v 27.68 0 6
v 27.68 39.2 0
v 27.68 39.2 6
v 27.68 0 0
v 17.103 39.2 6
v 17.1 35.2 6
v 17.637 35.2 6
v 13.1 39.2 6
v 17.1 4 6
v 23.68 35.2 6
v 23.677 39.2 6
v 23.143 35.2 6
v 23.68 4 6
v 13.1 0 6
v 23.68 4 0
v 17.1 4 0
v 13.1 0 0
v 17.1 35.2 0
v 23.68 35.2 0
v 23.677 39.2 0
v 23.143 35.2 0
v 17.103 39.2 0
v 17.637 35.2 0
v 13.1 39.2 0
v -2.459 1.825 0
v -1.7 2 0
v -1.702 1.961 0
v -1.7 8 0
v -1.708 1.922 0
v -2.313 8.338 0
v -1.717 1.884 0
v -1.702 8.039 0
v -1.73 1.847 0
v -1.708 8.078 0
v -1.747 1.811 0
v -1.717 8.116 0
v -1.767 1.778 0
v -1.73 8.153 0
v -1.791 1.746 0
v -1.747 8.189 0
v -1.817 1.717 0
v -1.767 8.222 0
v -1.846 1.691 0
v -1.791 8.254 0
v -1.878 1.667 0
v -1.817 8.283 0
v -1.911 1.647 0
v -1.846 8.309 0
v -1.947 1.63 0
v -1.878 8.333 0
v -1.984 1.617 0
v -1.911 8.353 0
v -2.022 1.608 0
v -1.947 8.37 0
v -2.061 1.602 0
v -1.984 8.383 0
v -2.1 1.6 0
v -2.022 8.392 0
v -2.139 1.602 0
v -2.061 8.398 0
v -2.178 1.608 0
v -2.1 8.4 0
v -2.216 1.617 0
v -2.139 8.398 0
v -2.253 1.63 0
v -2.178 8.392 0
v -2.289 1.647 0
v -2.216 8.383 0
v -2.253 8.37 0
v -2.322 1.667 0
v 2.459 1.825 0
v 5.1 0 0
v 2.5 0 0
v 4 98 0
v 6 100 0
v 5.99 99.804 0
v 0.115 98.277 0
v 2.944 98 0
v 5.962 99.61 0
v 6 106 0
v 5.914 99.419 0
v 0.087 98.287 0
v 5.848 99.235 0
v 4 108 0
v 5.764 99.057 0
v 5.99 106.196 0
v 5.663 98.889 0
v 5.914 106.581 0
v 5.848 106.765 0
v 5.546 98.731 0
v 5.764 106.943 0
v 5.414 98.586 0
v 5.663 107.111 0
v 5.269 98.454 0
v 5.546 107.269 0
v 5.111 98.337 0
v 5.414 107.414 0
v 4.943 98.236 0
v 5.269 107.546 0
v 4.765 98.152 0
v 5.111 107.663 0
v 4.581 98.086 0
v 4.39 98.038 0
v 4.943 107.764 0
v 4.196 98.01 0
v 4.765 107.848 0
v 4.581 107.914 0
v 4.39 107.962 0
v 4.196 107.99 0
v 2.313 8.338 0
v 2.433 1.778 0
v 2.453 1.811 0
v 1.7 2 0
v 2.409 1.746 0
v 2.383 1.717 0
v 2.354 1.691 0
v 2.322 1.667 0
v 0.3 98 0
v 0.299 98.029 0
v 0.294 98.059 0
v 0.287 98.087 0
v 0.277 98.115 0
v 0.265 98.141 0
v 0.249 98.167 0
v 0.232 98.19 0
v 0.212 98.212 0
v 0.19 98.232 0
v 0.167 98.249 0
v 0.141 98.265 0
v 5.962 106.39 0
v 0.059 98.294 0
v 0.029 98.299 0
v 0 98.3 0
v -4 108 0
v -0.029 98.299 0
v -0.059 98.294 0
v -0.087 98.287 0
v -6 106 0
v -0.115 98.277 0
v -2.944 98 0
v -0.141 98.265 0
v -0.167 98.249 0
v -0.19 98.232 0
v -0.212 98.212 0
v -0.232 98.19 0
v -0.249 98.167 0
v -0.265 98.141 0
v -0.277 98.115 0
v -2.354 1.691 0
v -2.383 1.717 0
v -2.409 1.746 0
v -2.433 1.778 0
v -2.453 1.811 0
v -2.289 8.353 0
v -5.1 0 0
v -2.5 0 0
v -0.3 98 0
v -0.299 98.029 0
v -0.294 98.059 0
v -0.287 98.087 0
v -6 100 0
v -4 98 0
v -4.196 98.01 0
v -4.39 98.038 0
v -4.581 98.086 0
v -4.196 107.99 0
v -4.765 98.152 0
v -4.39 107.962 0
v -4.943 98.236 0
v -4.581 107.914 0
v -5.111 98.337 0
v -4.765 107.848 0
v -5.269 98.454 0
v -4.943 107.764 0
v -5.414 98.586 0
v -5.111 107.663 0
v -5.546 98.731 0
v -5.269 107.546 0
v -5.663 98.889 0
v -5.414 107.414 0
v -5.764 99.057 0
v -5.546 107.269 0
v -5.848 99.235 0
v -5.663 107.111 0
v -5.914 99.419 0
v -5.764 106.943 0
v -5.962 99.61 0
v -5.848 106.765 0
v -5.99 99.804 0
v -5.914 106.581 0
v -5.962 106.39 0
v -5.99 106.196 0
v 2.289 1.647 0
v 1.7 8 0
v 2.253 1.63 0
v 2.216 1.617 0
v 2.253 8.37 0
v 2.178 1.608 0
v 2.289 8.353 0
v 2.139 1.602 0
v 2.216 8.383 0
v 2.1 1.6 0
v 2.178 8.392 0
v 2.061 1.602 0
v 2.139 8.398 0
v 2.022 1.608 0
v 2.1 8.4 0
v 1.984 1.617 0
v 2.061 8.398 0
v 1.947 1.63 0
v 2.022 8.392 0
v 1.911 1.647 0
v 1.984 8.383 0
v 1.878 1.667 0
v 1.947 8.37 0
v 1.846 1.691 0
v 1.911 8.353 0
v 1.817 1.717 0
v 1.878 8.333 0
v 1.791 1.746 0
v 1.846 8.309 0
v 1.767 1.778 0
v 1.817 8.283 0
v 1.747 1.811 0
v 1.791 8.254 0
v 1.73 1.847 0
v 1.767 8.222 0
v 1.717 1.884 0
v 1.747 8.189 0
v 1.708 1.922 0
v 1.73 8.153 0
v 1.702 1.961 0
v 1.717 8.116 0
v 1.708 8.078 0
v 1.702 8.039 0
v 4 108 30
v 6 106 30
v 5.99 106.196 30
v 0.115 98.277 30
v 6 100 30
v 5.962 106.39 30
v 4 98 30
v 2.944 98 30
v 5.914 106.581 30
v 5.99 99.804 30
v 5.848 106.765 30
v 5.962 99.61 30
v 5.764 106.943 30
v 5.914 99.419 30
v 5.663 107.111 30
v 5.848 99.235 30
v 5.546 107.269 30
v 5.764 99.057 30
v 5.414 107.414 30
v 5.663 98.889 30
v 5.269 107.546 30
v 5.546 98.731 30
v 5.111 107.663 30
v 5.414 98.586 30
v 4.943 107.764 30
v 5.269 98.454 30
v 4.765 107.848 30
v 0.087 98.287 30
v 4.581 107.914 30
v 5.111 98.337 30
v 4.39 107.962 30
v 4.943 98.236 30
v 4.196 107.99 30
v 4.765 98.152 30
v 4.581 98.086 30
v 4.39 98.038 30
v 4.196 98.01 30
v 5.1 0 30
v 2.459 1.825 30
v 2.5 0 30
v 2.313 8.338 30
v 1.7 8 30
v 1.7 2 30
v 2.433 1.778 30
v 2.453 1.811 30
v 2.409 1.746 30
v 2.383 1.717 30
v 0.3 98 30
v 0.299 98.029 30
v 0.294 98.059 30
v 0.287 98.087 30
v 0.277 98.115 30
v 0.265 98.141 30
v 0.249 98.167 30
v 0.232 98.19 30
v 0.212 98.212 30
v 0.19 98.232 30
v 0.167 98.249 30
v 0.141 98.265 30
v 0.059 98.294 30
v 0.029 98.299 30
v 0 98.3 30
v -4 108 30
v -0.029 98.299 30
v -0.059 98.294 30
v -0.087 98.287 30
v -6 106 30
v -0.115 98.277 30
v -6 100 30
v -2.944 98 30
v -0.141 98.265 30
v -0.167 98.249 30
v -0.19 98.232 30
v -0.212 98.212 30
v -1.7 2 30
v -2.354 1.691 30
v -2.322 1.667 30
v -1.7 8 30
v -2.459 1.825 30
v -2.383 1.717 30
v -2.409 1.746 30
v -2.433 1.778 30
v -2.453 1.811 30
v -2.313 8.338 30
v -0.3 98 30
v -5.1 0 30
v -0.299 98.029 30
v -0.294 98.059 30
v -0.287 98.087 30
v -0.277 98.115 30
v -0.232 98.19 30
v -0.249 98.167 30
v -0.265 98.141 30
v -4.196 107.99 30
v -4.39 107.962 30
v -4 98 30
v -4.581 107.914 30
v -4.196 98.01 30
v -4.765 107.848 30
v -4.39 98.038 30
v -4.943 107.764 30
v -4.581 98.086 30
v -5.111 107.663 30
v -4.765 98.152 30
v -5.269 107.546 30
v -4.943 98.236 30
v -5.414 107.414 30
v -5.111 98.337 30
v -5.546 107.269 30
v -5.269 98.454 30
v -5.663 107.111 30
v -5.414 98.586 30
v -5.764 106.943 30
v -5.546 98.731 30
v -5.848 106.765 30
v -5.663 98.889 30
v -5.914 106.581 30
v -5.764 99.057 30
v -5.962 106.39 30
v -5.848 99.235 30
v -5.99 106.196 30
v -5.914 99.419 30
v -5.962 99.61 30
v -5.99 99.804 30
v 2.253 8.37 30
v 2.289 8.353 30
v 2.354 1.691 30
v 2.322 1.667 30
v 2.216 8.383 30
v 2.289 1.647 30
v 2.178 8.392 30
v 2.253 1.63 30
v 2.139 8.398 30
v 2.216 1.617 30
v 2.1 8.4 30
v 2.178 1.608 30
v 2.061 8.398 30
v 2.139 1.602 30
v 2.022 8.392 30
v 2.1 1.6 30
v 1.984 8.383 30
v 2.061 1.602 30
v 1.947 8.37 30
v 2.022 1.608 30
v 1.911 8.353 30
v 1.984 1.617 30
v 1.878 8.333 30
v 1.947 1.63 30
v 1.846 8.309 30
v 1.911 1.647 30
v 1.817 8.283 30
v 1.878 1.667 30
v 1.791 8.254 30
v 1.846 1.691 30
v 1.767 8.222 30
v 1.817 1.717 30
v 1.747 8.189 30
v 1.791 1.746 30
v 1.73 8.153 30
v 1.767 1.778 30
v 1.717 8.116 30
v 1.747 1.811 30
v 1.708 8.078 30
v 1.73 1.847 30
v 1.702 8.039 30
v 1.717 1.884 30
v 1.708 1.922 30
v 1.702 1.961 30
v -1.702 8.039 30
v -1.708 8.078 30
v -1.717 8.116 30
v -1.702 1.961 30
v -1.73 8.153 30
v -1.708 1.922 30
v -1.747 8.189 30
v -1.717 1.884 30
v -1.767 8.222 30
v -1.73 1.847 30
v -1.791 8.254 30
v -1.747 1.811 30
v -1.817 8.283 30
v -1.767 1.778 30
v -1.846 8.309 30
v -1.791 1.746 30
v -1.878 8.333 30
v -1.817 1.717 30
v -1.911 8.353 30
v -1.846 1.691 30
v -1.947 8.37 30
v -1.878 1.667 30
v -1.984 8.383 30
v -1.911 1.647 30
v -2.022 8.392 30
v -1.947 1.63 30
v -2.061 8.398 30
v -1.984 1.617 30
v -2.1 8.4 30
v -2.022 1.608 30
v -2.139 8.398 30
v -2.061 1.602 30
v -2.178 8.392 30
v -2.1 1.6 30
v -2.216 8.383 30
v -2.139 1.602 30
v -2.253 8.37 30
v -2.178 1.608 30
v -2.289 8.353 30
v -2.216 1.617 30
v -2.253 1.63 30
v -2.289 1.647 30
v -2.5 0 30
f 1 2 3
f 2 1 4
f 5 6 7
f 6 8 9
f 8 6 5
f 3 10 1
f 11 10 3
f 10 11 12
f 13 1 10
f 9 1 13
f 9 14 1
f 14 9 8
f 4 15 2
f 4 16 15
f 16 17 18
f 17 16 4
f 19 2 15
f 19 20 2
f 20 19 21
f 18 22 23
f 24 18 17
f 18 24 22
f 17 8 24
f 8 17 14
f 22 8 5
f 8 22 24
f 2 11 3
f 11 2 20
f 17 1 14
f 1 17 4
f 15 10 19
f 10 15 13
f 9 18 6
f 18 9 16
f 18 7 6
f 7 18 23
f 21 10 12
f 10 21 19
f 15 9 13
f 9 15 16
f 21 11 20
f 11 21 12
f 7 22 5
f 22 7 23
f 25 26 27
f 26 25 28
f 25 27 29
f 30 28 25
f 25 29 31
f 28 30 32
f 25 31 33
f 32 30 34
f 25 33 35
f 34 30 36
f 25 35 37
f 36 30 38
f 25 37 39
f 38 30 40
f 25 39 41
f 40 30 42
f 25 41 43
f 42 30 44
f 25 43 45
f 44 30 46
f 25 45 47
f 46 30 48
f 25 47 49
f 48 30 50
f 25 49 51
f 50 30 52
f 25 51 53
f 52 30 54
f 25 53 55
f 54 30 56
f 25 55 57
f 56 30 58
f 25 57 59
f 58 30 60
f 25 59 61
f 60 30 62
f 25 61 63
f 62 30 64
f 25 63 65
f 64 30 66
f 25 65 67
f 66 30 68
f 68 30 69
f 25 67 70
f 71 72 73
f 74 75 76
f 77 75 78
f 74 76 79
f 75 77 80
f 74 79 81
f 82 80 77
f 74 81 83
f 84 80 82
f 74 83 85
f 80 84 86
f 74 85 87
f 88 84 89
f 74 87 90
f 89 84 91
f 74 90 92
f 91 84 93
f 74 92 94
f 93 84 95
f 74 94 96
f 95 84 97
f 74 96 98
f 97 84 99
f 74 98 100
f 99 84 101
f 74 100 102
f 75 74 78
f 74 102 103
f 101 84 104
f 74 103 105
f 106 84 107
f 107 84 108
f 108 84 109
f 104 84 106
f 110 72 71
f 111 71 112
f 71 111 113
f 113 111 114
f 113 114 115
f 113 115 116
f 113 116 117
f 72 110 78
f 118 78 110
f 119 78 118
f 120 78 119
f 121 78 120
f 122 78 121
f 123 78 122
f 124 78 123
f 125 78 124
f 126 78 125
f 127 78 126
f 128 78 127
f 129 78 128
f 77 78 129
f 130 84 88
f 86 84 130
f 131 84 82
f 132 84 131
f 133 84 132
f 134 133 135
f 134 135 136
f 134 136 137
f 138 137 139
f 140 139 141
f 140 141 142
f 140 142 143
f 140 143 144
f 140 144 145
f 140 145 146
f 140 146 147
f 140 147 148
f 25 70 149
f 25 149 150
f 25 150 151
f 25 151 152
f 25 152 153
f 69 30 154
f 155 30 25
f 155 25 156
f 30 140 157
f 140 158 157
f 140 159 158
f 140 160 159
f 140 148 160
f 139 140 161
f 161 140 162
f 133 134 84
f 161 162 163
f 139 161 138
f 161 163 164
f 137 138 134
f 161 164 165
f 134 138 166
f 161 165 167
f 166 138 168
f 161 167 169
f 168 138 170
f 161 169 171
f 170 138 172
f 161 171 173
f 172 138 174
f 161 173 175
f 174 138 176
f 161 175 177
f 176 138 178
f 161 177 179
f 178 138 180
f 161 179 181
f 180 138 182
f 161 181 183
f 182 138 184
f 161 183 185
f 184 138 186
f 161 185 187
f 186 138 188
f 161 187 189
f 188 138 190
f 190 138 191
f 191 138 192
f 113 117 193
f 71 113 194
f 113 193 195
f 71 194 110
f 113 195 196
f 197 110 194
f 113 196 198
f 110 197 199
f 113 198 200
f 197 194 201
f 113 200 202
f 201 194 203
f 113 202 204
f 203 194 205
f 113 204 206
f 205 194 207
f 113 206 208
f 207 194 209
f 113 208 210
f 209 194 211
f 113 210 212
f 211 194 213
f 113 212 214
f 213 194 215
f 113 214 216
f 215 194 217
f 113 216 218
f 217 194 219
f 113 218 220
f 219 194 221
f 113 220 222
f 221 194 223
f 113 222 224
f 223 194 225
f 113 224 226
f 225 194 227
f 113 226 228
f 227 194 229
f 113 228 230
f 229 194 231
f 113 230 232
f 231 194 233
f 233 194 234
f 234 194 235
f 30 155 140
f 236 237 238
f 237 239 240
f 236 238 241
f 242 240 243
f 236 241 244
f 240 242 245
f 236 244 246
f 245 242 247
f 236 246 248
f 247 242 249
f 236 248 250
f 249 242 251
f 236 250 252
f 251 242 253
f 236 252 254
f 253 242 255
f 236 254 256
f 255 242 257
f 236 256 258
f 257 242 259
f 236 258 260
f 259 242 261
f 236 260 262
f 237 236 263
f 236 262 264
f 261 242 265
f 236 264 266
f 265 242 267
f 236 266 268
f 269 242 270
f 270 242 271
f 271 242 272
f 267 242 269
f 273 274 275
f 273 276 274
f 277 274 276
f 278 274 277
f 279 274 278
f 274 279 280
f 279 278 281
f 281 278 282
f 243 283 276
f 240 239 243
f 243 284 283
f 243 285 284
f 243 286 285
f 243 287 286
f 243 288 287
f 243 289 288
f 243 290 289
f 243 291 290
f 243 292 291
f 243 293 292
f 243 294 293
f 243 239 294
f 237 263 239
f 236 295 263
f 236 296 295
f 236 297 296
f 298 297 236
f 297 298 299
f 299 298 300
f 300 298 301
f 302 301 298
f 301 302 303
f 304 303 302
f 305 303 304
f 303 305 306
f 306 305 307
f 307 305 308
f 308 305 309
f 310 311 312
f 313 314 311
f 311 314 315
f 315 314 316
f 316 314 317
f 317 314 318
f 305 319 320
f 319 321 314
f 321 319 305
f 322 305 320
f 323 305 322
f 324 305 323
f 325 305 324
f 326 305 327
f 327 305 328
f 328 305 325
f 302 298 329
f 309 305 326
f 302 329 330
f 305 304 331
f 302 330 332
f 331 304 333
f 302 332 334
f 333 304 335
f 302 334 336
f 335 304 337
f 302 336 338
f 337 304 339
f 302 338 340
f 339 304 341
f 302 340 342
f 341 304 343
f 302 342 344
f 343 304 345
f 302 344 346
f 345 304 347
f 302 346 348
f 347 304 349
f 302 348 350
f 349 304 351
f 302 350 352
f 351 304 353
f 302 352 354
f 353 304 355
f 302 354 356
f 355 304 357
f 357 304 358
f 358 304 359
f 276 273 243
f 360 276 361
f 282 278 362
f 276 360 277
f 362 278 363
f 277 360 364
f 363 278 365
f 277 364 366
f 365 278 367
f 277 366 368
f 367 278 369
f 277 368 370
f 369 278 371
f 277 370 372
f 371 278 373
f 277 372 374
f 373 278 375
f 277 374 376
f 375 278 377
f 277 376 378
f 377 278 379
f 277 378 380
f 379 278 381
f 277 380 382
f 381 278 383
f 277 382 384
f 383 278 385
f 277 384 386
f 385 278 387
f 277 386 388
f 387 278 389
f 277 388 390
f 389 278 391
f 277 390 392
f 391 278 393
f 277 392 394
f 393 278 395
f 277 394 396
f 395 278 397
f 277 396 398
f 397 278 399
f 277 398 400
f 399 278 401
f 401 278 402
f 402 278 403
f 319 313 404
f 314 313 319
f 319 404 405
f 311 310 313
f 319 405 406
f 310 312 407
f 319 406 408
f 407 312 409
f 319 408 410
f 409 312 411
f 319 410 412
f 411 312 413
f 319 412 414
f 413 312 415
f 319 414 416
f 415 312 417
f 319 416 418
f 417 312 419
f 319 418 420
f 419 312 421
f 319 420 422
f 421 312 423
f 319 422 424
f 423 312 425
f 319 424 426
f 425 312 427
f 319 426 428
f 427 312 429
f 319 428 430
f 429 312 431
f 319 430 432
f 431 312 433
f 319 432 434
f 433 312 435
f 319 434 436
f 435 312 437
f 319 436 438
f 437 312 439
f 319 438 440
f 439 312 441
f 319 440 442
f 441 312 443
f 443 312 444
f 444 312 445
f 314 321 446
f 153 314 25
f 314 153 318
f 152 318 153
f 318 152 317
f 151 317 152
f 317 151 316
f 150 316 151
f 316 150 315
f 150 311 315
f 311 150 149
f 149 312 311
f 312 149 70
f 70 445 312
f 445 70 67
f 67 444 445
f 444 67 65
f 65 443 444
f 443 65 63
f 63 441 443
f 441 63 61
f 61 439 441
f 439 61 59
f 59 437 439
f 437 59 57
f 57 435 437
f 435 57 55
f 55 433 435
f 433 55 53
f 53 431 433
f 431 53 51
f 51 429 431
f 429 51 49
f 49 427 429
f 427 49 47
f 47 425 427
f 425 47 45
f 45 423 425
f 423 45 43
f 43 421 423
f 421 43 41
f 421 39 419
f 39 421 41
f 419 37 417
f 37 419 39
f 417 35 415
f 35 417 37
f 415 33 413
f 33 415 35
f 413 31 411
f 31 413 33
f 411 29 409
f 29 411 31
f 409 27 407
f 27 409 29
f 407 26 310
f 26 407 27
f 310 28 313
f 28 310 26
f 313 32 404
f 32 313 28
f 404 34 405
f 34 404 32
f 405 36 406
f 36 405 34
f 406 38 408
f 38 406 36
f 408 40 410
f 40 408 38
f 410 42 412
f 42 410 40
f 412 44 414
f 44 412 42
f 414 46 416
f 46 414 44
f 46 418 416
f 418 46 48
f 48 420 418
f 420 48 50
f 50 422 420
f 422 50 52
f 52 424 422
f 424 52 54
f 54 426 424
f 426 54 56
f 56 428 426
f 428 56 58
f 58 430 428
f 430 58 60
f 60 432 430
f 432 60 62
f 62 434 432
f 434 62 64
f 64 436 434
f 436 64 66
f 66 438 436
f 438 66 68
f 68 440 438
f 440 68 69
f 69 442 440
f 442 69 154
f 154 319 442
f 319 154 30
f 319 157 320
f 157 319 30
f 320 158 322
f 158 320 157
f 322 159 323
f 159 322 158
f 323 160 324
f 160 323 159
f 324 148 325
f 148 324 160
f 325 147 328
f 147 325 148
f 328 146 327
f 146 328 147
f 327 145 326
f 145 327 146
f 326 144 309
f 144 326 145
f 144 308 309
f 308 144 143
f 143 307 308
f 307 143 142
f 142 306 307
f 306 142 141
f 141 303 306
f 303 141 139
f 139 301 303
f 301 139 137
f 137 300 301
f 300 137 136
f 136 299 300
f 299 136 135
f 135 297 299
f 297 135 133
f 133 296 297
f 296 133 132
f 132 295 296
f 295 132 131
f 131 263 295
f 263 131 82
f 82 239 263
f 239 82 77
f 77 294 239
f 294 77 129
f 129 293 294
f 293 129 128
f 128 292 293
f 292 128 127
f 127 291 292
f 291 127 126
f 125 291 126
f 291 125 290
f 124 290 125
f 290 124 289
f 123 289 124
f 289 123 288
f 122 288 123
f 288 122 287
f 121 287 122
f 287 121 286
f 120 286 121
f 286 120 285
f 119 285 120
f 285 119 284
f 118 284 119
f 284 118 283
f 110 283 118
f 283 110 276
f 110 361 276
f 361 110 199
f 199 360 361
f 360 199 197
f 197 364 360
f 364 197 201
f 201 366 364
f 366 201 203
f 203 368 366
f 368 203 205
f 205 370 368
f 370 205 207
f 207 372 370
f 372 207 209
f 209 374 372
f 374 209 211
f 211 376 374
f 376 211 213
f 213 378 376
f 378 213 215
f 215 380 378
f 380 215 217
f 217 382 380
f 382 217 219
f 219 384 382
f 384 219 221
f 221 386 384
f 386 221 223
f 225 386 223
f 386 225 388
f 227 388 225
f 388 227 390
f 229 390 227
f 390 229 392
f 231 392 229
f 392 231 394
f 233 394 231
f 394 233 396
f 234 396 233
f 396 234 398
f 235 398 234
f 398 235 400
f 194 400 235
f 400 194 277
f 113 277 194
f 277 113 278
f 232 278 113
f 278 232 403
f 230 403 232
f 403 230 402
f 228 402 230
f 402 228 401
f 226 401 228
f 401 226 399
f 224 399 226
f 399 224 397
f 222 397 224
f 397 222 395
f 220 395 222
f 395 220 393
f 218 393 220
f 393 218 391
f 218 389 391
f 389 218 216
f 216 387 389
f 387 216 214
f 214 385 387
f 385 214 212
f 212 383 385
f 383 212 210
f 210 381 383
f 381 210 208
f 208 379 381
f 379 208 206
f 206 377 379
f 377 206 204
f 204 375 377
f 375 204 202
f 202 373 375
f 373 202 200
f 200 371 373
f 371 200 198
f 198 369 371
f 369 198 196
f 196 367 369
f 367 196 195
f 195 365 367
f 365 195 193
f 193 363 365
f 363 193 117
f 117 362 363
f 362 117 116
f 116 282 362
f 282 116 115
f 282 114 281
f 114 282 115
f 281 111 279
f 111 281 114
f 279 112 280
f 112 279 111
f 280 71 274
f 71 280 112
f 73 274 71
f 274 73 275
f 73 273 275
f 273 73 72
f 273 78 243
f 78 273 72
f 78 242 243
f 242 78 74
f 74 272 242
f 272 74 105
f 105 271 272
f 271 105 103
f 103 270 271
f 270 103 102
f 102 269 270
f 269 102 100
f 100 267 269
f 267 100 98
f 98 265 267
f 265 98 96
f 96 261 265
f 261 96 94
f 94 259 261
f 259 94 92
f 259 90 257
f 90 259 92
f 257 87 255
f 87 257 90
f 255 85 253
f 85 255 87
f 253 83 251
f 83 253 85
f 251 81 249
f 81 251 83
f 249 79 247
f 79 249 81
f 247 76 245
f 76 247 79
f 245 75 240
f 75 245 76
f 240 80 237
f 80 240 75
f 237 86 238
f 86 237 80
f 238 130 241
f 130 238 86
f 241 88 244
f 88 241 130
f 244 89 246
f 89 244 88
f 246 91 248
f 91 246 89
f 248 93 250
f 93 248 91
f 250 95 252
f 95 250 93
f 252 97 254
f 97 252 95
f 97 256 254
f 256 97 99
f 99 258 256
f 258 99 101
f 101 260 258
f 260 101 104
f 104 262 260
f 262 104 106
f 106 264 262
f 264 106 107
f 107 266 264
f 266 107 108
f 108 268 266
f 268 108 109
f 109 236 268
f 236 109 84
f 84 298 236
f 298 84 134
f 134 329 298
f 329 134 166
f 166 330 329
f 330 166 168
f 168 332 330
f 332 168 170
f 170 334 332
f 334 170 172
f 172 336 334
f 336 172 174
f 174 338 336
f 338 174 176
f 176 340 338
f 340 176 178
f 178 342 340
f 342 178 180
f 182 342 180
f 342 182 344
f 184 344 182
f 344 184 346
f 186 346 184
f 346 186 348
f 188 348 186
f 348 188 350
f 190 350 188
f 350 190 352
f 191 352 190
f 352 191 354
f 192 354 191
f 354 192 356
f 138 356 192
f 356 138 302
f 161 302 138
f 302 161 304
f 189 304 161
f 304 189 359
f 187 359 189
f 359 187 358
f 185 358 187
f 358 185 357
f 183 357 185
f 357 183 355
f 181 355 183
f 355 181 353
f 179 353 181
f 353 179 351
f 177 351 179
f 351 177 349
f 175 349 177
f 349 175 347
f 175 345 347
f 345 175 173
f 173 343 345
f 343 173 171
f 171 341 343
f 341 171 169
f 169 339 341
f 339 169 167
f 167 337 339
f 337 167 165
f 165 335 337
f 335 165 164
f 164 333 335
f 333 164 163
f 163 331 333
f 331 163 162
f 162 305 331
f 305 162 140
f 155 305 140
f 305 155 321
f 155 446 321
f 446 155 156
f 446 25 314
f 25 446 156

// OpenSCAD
// file: lib/tong.scad
// Smooth pads protect the paper edge. Arms overlap the handle over a full area.
module tong_profile(gripping = false) {
    gap = gripping ? tong_closed_gap : tong_gap_jaw;
    difference() {
        union() {
            polygon([
                [-gap / 2 - tong_arm_thickness, 0],
                [ gap / 2 + tong_arm_thickness, 0],
                [ tong_gap_top / 2 + tong_arm_thickness, tong_arm_length],
                [-tong_gap_top / 2 - tong_arm_thickness, tong_arm_length]
            ]);
            translate([0, tong_arm_length + tong_handle_height / 2 - 2])
                offset(r = 2) square([tong_handle_width - 4, tong_handle_height - 4], center = true);
        }
        polygon([
            [-tong_inner(-eps, gap), -eps], [tong_inner(-eps, gap), -eps],
            [tong_gap_top / 2, tong_arm_length - 2], [-tong_gap_top / 2, tong_arm_length - 2]
        ]);
        translate([0, tong_arm_length - 2]) circle(d = tong_gap_top);
    }
    for (s = [-1, 1]) hull() for (v = [2, tong_pad_length])
        translate([s * (gap / 2 - tong_pad_depth / 2), v]) circle(r = tong_pad_depth / 2);
}
module tong(gripping = false) { linear_extrude(height = tong_grip_width) tong_profile(gripping); }
module collar() {
    difference() {
        translate([-collar_outer_u / 2, -collar_inner_z / 2 - collar_wall, 0])
            cube([collar_outer_u, collar_inner_z + 2 * collar_wall, collar_height]);
        translate([-collar_gap / 2, -collar_inner_z / 2, -eps])
            cube([collar_gap, collar_inner_z, collar_height + 2 * eps]);
        // Snap onto the neck sideways: a closed ring cannot pass the grip pads.
        // Short retaining lips and a flared lead-in permit a removable C-shaped collar.
        translate([0, 0, -eps]) linear_extrude(height = collar_height + 2 * eps)
            polygon([
                [-collar_snap_gap / 2, collar_inner_z / 2 - eps],
                [ collar_snap_gap / 2, collar_inner_z / 2 - eps],
                [ collar_gap / 2, collar_inner_z / 2 + collar_wall + eps],
                [-collar_gap / 2, collar_inner_z / 2 + collar_wall + eps]
            ]);
    }
}
module parked_collar() {
    translate([0, tong_arm_length - 2, tong_grip_width / 2]) rotate([90, 0, 0]) collar();
}
module gripping_collar() {
    translate([0, tong_reach + collar_height, tong_grip_width / 2]) rotate([90, 0, 0]) collar();
}
// Nominal flex pose for clearance checks, not a mechanical force simulation.
module immersed_tong(i) {
    multmatrix([[0, 0, 1, (outer_width - tong_grip_width) / 2],
                [1, 0, 0, slot_yc(i)],
                [0, 1, 0, fill_z - tong_pad_length], [0, 0, 0, 1]]) {
        tong(true);
        gripping_collar();
    }
}
module tong_plate() {
    tong();
    translate([tong_gap_jaw / 2 + tong_arm_thickness + plate_gap + collar_outer_u / 2,
        collar_inner_z / 2 + collar_wall, 0]) collar();
}
// main file
// Snap the C-shaped collar onto the arms from the side, near the handle.
// Slide toward the jaws to grip; park near the handle to release.
include <lib/parameters.scad>
include <lib/tong.scad>
show = "plate"; // [plate,assembled,tong,collar]
validate_parameters() {
    if (show == "plate") tong_plate();
    else if (show == "assembled") { tong(); parked_collar(); }
    else if (show == "tong") tong();
    else if (show == "collar") collar();
    else assert(false, "show must be plate, assembled, tong or collar.");
}
